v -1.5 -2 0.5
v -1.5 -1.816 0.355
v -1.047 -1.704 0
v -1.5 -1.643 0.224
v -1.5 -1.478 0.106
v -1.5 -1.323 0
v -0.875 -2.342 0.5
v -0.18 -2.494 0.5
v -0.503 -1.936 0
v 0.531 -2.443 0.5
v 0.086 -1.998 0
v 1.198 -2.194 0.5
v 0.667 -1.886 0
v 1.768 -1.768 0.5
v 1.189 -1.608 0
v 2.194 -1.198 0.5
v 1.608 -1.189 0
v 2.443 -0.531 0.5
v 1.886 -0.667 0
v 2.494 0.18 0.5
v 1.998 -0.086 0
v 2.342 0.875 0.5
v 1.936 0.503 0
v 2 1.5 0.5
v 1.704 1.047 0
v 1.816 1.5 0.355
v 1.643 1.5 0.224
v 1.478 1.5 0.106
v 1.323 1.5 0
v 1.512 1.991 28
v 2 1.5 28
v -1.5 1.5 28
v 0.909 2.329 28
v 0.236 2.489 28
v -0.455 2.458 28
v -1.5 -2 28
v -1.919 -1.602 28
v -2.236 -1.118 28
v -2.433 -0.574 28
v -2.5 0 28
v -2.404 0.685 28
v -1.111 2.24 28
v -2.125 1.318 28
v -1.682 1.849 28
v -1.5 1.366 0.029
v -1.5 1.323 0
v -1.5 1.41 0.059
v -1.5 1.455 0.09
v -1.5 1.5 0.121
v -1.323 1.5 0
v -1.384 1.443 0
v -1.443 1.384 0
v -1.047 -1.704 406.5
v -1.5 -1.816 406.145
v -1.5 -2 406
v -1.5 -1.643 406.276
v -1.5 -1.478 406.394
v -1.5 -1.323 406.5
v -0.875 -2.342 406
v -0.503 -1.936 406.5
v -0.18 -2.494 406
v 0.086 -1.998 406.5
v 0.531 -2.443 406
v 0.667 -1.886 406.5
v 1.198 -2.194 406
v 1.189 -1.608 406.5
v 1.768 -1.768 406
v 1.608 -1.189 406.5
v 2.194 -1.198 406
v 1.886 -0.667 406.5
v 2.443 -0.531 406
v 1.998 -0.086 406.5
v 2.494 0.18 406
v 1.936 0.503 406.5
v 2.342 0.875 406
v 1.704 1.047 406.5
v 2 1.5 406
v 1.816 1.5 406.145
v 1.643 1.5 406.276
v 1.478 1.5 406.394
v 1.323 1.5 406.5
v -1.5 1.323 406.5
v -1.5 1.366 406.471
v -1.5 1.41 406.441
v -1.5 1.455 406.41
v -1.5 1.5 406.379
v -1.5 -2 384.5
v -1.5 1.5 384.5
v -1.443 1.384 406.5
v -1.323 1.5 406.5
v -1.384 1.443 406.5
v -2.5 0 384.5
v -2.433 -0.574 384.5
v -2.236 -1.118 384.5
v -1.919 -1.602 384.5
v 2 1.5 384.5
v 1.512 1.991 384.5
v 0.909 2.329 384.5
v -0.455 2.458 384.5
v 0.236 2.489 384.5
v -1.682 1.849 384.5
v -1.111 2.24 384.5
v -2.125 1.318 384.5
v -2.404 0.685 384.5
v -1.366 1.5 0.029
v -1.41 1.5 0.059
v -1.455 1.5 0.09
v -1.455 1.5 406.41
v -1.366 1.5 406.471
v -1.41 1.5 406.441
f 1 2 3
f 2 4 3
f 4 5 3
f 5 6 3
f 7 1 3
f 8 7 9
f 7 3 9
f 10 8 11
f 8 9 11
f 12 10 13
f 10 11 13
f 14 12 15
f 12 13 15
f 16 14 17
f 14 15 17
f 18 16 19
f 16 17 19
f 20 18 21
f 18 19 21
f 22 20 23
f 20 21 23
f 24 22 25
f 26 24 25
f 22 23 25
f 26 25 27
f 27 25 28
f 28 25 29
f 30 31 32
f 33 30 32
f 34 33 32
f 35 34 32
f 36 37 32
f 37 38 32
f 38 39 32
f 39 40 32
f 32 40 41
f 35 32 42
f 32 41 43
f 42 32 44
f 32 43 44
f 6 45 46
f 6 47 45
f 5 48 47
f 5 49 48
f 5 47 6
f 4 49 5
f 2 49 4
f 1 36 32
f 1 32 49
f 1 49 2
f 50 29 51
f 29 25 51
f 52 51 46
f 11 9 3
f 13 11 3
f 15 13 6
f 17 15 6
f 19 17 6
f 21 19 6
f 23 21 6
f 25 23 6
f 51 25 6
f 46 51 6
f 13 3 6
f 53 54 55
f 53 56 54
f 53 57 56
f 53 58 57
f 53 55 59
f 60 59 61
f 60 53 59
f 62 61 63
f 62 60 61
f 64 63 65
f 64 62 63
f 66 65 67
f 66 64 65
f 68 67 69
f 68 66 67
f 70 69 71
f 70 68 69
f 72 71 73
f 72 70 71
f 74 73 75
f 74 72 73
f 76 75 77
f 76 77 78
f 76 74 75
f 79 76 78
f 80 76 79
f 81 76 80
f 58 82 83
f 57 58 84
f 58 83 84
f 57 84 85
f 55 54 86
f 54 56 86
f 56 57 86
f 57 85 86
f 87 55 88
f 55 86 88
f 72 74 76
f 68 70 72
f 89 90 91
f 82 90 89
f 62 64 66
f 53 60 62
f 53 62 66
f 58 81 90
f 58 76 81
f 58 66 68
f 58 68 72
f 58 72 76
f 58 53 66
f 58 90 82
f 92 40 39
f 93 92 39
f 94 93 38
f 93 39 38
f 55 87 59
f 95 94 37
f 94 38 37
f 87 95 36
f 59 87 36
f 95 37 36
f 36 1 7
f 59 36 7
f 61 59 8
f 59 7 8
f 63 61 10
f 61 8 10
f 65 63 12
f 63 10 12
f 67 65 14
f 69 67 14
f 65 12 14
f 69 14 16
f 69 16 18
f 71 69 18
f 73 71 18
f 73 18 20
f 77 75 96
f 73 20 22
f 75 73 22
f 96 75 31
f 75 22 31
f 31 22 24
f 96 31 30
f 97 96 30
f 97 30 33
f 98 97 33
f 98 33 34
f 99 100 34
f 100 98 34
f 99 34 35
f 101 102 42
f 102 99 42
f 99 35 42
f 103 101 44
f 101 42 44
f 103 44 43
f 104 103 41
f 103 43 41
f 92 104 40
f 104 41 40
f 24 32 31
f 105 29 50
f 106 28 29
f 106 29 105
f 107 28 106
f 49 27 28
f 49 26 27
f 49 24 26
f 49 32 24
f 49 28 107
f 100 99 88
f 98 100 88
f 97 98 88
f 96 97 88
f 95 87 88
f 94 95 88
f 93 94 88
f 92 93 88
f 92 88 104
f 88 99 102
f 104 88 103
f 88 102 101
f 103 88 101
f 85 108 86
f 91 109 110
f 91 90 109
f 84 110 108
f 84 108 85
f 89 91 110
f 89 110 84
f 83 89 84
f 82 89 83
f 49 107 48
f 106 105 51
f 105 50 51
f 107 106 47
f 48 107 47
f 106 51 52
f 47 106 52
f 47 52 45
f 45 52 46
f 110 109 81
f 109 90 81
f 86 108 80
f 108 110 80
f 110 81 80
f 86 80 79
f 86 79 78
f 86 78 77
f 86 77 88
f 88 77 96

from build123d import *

# Parameters (mm, degrees)
SKETCH_1_R        = 2.5
BODY_DEPTH        = 406.5
CHAMFEREDGES_SIZE = 0.5
SKETCH2_W         = 28.630475487
SKETCH2_H         = 2.50986962
SKETCH2_W_2       = 28
SKETCH2_H_2       = 1.942146438
FIRSTSLOTS_DEPTH  = 407.515374863
CIRPATTERN1_COUNT = 2
CIRPATTERN1_ANGLE = 90


with BuildPart() as part:
    # Эскиз1 → Body (new body)
    with BuildSketch(Plane.XY):
        with Locations(Location((0, 0, 0), (0, 0, 180))):
            Circle(SKETCH_1_R)
    extrude(amount=BODY_DEPTH)

    # ChamferEdges
    chamferedges_edges = [part.edges().sort_by_distance(p)[0] for p in [
        (2.5, 0, 0),
        (2.5, 0, 406.5),
    ]]
    chamfer(chamferedges_edges, length=CHAMFEREDGES_SIZE)

    # Sketch2 → FirstSlots (cut, symmetric)
    with BuildSketch(Plane(origin=(0, 0, 0), x_dir=(0, 0, -1), z_dir=(1, 0, 0))):
        with Locations((-13.684762257, 2.75493481)):
            Rectangle(SKETCH2_W, SKETCH2_H)
        with Locations((-398.5, 2.471073219)):
            Rectangle(SKETCH2_W_2, SKETCH2_H_2)
    firstslots = extrude(amount=FIRSTSLOTS_DEPTH, both=True, mode=Mode.SUBTRACT)

    # CirPattern1: FirstSlots ×2 about axis
    cirpattern1_axis = Axis((0, 0, 406.5), (0, 0, 1))
    for i in range(1, CIRPATTERN1_COUNT):
        add(firstslots.rotate(cirpattern1_axis, i * CIRPATTERN1_ANGLE / (CIRPATTERN1_COUNT - 1)), mode=Mode.SUBTRACT)


solid = part.part
